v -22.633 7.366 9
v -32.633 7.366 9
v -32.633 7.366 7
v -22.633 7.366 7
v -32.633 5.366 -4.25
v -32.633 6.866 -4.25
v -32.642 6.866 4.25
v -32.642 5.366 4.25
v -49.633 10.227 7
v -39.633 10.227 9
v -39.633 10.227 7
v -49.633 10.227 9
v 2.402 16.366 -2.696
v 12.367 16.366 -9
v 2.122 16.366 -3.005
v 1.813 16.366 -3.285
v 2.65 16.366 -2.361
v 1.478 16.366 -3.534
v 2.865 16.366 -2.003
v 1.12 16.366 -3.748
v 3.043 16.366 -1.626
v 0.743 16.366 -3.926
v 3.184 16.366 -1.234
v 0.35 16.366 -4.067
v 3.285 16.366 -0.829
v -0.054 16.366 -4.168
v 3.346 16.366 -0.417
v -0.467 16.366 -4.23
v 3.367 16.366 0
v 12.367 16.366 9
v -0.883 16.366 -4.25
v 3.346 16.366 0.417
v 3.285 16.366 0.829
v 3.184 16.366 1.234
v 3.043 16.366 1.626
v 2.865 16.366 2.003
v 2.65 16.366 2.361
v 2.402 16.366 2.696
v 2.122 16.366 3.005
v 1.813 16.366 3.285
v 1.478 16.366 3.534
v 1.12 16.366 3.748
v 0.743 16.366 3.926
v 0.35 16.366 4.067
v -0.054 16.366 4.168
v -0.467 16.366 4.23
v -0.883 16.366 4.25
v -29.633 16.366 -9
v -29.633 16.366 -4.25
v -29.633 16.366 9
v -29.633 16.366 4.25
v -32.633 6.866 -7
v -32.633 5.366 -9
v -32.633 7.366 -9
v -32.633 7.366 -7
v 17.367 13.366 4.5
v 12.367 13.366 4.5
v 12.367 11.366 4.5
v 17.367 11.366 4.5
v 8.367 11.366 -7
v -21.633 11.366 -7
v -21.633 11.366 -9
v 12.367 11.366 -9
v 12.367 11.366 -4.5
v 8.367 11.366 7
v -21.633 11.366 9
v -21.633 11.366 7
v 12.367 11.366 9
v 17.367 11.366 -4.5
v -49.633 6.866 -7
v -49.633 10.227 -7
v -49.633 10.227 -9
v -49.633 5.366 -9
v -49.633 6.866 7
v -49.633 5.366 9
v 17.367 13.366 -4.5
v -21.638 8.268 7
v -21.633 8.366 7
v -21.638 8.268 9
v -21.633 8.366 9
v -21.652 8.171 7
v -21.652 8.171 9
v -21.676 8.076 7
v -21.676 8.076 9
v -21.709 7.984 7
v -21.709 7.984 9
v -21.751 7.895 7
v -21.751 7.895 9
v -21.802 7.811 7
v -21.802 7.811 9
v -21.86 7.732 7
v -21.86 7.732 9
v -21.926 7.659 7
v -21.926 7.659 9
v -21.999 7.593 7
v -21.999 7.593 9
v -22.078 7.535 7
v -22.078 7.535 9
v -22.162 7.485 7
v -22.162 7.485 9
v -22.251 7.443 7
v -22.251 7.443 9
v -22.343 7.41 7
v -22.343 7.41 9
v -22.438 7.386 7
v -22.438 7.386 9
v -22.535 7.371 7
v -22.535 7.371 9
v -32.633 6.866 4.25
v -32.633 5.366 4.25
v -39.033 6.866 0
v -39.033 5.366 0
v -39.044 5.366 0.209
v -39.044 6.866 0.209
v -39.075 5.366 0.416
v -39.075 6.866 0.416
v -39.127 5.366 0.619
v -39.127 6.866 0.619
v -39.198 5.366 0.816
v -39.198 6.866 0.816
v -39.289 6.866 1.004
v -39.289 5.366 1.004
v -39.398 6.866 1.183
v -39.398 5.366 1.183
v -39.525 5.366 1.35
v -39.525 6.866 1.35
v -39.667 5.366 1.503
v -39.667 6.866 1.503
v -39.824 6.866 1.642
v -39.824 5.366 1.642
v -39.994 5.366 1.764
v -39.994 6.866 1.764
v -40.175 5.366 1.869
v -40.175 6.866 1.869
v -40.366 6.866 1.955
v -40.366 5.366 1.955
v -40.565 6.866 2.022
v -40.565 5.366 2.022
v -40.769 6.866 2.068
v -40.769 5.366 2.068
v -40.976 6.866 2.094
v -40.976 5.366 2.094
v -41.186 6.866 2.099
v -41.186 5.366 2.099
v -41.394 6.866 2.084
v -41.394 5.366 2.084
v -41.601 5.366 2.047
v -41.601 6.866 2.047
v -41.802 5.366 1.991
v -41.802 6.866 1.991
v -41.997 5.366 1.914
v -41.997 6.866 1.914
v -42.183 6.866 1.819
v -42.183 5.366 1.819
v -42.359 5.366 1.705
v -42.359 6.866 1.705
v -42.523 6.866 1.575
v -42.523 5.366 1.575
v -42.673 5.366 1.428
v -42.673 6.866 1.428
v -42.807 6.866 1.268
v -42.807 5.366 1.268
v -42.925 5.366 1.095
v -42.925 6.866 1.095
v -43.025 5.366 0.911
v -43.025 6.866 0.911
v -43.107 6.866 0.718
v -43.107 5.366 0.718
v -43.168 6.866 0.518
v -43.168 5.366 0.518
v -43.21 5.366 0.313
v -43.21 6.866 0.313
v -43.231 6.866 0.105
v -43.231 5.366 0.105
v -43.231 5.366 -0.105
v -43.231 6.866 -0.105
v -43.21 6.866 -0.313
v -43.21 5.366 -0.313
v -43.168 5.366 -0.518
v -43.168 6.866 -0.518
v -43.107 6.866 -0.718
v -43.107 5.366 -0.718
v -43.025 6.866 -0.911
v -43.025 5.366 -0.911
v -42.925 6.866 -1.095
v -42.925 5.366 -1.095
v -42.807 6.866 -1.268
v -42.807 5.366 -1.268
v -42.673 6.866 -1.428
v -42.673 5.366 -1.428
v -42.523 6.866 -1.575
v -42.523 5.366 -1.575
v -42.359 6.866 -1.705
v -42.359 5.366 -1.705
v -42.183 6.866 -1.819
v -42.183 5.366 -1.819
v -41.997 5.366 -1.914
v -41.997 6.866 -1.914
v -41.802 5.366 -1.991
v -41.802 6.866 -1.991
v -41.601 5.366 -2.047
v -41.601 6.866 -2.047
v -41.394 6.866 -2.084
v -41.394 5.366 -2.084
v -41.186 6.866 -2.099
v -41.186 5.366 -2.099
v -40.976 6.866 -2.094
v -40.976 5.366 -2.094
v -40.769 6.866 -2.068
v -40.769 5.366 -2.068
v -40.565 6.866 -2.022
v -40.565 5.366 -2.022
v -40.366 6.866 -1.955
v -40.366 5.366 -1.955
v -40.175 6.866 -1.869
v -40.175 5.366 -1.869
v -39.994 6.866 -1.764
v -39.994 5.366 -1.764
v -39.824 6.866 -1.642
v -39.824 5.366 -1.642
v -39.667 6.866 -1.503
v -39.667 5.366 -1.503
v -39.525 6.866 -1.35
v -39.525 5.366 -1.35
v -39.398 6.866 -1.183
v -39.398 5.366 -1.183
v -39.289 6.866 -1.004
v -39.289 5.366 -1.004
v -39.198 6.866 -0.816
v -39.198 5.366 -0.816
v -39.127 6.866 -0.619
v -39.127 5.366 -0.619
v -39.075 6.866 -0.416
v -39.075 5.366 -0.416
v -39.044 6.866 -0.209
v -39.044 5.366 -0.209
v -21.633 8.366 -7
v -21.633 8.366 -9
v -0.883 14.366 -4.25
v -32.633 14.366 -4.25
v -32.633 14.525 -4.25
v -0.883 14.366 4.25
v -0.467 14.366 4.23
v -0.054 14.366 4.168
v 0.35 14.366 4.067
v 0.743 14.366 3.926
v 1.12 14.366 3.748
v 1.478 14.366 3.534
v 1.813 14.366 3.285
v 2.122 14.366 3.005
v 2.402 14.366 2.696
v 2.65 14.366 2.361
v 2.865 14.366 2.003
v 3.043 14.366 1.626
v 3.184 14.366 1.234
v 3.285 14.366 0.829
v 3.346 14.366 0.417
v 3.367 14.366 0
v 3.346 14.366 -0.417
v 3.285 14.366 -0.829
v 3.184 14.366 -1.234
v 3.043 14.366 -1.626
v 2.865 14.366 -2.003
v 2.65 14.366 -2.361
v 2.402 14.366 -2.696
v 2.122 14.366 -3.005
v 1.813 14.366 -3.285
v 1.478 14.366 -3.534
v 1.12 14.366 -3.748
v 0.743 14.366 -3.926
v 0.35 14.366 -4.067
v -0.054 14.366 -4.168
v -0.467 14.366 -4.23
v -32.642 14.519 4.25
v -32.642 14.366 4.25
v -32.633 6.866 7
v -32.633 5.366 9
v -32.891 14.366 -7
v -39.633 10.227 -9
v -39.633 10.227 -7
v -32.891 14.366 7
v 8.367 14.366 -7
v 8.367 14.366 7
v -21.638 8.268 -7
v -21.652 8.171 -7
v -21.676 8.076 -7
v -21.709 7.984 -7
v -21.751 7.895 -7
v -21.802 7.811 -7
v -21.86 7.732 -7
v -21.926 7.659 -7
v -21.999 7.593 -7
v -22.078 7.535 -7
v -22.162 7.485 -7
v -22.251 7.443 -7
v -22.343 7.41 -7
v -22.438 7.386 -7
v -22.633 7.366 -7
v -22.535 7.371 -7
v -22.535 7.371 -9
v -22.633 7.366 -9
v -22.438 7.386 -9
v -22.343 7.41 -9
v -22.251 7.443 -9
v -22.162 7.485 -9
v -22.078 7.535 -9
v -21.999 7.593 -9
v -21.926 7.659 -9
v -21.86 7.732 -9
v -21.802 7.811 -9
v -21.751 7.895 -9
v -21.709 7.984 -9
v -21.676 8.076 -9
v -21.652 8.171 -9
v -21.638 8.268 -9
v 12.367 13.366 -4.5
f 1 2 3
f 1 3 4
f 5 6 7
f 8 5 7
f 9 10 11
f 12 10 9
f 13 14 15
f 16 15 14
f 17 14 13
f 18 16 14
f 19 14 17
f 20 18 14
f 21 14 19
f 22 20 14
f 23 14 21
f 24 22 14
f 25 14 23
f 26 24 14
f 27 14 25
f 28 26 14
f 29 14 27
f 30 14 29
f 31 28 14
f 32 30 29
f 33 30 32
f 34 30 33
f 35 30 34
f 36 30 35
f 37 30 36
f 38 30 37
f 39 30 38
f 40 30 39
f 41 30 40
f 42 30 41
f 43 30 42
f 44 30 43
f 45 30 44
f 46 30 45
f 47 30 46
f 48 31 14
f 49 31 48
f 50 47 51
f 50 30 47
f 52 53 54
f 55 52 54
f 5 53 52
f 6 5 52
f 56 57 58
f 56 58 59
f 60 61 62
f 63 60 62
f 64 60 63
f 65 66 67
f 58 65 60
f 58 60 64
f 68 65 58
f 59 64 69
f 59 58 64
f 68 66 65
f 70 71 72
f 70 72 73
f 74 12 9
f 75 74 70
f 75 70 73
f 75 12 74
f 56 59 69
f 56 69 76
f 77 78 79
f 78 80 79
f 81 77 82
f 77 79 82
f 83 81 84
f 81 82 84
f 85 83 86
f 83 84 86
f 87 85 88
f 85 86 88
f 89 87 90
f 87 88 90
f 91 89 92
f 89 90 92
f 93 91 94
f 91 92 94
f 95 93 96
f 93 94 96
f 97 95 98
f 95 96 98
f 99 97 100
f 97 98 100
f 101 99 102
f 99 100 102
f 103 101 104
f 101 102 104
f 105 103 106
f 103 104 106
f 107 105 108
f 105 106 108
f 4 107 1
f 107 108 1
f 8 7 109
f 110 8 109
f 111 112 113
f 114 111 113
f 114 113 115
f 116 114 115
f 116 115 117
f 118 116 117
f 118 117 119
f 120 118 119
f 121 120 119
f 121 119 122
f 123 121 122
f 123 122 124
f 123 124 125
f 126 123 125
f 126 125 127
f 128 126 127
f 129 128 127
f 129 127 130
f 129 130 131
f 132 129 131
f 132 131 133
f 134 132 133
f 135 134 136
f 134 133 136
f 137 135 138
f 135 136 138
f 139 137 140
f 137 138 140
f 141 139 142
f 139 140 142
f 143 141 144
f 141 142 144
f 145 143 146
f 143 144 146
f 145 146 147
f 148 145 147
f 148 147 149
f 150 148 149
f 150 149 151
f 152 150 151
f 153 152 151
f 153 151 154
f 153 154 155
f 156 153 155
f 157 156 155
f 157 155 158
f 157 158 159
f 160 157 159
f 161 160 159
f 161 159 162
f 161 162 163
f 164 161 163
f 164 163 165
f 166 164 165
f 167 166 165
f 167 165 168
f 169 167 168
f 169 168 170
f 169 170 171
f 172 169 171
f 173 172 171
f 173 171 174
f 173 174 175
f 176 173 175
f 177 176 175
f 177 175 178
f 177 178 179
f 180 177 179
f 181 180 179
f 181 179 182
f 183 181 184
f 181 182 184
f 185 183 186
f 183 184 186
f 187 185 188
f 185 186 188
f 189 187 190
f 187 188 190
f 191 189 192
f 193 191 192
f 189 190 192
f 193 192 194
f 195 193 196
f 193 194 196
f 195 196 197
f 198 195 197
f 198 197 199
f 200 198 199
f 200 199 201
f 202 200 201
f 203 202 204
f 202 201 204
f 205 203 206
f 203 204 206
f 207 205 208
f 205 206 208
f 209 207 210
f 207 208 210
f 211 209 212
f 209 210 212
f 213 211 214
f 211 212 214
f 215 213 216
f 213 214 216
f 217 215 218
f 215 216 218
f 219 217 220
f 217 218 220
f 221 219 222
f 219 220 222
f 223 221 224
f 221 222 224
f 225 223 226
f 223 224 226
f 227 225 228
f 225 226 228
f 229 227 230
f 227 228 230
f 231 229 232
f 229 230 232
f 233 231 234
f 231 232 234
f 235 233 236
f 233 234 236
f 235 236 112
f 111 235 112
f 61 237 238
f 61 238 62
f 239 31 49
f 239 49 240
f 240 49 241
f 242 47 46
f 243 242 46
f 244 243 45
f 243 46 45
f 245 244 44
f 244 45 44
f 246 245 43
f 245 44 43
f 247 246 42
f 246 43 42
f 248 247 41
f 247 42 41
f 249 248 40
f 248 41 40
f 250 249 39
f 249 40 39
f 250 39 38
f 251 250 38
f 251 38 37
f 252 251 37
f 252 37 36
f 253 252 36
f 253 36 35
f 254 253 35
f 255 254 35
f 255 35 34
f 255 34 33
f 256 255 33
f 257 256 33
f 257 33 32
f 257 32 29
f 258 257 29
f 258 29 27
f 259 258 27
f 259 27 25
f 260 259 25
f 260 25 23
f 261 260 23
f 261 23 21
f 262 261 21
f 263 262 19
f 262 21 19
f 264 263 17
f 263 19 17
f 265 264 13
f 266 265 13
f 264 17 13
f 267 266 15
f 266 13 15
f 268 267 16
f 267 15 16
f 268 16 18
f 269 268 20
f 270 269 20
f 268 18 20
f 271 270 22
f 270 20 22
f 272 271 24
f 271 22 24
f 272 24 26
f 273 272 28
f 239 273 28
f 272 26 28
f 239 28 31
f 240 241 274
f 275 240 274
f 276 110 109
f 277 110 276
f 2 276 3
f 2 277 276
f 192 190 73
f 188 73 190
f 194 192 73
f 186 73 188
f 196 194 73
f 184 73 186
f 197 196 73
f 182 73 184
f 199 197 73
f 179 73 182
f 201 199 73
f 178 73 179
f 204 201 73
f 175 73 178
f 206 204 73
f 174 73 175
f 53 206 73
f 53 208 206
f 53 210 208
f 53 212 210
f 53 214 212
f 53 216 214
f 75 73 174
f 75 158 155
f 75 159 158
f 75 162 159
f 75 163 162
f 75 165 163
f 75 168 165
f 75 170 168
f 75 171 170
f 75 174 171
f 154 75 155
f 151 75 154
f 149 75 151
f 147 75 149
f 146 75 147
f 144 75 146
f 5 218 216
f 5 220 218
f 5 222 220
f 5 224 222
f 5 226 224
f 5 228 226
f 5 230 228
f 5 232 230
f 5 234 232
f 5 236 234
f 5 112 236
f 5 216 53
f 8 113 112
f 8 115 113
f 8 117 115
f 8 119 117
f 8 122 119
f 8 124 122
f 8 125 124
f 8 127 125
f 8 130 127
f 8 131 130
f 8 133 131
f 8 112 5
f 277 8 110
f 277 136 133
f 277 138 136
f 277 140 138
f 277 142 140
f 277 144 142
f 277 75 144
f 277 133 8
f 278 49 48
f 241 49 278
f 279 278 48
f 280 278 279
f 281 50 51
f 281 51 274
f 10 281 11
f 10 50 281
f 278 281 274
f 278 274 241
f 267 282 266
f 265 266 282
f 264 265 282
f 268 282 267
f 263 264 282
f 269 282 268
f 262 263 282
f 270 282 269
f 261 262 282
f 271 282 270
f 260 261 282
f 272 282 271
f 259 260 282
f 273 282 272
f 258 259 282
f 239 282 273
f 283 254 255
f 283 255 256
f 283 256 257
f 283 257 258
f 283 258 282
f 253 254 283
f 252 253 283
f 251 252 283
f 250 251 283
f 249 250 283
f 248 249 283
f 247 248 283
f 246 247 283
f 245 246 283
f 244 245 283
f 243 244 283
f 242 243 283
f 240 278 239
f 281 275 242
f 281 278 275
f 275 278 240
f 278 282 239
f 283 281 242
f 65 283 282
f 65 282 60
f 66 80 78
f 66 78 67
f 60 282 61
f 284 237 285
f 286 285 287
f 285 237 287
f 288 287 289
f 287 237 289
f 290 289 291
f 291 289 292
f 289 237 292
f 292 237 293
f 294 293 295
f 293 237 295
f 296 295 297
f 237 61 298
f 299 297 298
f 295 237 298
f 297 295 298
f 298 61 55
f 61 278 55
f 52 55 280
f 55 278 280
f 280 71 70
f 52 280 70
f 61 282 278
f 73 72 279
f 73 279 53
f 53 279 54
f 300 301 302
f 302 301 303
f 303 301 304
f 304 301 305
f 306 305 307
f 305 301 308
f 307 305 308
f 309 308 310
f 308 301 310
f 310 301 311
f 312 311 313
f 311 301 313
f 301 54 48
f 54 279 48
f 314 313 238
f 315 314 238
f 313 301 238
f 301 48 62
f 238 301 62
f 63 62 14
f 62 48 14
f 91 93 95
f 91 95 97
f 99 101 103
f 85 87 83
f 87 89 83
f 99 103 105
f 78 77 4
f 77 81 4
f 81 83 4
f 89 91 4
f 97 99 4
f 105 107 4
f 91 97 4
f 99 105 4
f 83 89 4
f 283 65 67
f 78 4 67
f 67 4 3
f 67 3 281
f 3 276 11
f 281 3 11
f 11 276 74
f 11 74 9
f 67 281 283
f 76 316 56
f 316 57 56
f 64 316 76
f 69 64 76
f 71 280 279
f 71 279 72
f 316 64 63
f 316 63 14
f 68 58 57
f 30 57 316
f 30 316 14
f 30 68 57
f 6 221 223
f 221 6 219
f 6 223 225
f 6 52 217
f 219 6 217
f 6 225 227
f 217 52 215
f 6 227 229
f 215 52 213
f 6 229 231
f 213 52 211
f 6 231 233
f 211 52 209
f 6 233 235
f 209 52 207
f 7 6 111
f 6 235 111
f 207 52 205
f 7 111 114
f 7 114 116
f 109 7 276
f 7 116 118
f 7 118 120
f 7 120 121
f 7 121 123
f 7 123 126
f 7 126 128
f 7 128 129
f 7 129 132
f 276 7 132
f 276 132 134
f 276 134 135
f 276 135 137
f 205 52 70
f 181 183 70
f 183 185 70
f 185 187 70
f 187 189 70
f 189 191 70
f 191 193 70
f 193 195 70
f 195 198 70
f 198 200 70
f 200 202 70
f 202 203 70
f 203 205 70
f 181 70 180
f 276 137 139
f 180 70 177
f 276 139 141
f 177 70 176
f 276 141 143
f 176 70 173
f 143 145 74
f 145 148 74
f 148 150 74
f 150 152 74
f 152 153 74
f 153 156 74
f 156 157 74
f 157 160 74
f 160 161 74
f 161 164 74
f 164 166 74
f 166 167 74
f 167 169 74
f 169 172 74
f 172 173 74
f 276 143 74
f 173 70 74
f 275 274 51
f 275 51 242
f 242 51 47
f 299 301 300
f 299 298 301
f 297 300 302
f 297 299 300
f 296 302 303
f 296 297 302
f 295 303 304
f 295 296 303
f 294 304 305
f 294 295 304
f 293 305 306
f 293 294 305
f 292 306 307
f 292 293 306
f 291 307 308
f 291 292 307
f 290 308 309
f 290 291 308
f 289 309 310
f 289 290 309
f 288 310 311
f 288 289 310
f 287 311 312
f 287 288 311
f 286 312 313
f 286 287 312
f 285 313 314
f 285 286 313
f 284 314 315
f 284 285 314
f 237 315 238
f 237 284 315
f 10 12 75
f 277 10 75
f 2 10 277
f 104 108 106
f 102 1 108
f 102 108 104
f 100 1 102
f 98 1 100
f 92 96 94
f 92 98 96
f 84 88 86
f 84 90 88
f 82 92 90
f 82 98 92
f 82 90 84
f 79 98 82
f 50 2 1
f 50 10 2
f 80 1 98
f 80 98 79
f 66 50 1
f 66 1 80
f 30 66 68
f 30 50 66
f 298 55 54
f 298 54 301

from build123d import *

# Parameters (mm, degrees)
F1_DEPTH = 9
F0_W     = 5
F0_H     = 2
F2_DEPTH = 4.5
F3_R     = 2.1
F4_DEPTH = 11.001
F6_DEPTH = 11.001
F7_W     = 4.139266
F7_H     = 14
F7_W_2   = 3.360734
F8_DEPTH = 58
F9_R     = 1


with BuildPart() as f1:
    # F0 (on Top) → F1 (new body, symmetric)
    with BuildSketch(Plane.XY):
        Polygon((-49.633269, 10.227227), (-49.633269, 5.366493), (-32.633269, 5.366493), (-32.633269, 7.366493), (-21.633269, 7.366493), (-21.633269, 11.366493), (12.366731, 11.366493), (12.366731, 13.366493), (12.366731, 16.366493), (-29.633269, 16.366493), (-39.633269, 10.227227), align=None)
    extrude(amount=F1_DEPTH, both=True)

    # F0 (on Top) → F2 (join, symmetric)
    with BuildSketch(Plane.XY):
        with Locations((14.866731, 12.366493)):
            Rectangle(F0_W, F0_H)
    extrude(amount=F2_DEPTH, both=True)

    # F3 (on face) → F4 (cut, through all)
    with BuildSketch(Plane.XZ.offset(-5.366493)):
        with Locations((-41.133269, 0)):
            Circle(F3_R)
    extrude(amount=-F4_DEPTH, mode=Mode.SUBTRACT)

    # F5 (on face) → F6 (cut, through all)
    with BuildSketch(Plane(origin=(0, 16.366493, 0), x_dir=(-1, 0, 0), z_dir=(0, 1, 0))):
        with BuildLine():
            ThreePointArc((0.883269, 4.25), (-3.366731, 0), (0.883269, -4.25))
            Line((0.883269, -4.25), (29.534266, -4.25))
            Line((29.534266, -4.25), (29.633269, -4.25))
            Line((29.633269, -4.25), (29.633269, 4.25))
            Line((29.633269, 4.25), (29.534266, 4.25))
            Line((29.534266, 4.25), (0.883269, 4.25))
        make_face()
        Polygon((29.633269, 4.25), (29.633269, -4.25), (32.633269, -4.25), (32.642357, 4.25), align=None)
    extrude(amount=-F6_DEPTH, mode=Mode.SUBTRACT)

    # F7 (on face) → F8 (cut)
    with BuildSketch(Plane(origin=(-49.633269, 0, 0), x_dir=(0, -1, 0), z_dir=(-1, 0, 0))):
        with Locations((-12.29686, 0)):
            Rectangle(F7_W, F7_H)
        with Locations((-8.54686, 0)):
            Rectangle(F7_W_2, F7_H)
    extrude(amount=-F8_DEPTH, mode=Mode.SUBTRACT)

    # F9
    f9_edges = [f1.edges().sort_by_distance(p)[0] for p in [
        (-21.633269, 7.366493, 8),
        (-21.633269, 7.366493, -8),
    ]]
    fillet(f9_edges, radius=F9_R)


solid = f1.part
